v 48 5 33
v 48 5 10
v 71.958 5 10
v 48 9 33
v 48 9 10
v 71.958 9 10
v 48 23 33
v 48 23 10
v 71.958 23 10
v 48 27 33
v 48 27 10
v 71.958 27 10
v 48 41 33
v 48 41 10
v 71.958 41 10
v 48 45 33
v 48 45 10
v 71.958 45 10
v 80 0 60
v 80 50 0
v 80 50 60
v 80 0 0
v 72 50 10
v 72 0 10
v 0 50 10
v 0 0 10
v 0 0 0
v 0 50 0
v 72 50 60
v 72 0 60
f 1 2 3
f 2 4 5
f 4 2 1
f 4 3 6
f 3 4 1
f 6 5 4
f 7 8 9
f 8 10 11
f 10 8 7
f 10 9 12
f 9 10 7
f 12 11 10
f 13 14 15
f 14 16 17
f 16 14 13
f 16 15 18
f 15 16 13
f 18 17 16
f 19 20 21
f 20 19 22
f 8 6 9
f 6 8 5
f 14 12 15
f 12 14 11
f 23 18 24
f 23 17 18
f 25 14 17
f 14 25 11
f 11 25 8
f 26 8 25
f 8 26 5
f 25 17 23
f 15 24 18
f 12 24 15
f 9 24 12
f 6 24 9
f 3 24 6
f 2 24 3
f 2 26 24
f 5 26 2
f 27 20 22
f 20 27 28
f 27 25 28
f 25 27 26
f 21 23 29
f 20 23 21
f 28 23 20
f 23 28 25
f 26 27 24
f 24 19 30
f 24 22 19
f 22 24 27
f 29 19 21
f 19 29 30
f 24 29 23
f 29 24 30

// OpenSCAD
$fn = 32;

// ----------------------------------------------------------------------
// Rib bracket: 3-gusset L bracket
// ----------------------------------------------------------------------

// --- parameters (mm) ---
base_l = 80;              // foot length, X
base_w = 50;              // foot width, Y
base_t = 10;              // foot thickness
plate_t = 8;              // upright plate thickness
plate_h = 60;             // overall height
gus_l = 24;               // gusset leg along the foot
gus_h = 24;               // gusset height
gus_t = 4;                // gusset thickness
gus_edge = 5;             // gusset margin from the foot edge
n_gus = 3;                // gusset count

gus_pitch = (base_w - 2 * gus_edge - gus_t) / (n_gus - 1);  // gusset pitch

union() {
  cube([base_l, base_w, base_t]);
  translate([base_l - plate_t, 0, base_t - 1])
    cube([plate_t, base_w, plate_h - base_t + 1]);
  for (i = [0 : n_gus - 1])
    translate([base_l - plate_t - gus_l, gus_edge + i * gus_pitch, base_t - 1])
      rotate([-90, 0, 0])
        linear_extrude(height = gus_t)
          polygon(points = [[0, 0], [gus_l + 1, 0], [0, -gus_h]]);
}
